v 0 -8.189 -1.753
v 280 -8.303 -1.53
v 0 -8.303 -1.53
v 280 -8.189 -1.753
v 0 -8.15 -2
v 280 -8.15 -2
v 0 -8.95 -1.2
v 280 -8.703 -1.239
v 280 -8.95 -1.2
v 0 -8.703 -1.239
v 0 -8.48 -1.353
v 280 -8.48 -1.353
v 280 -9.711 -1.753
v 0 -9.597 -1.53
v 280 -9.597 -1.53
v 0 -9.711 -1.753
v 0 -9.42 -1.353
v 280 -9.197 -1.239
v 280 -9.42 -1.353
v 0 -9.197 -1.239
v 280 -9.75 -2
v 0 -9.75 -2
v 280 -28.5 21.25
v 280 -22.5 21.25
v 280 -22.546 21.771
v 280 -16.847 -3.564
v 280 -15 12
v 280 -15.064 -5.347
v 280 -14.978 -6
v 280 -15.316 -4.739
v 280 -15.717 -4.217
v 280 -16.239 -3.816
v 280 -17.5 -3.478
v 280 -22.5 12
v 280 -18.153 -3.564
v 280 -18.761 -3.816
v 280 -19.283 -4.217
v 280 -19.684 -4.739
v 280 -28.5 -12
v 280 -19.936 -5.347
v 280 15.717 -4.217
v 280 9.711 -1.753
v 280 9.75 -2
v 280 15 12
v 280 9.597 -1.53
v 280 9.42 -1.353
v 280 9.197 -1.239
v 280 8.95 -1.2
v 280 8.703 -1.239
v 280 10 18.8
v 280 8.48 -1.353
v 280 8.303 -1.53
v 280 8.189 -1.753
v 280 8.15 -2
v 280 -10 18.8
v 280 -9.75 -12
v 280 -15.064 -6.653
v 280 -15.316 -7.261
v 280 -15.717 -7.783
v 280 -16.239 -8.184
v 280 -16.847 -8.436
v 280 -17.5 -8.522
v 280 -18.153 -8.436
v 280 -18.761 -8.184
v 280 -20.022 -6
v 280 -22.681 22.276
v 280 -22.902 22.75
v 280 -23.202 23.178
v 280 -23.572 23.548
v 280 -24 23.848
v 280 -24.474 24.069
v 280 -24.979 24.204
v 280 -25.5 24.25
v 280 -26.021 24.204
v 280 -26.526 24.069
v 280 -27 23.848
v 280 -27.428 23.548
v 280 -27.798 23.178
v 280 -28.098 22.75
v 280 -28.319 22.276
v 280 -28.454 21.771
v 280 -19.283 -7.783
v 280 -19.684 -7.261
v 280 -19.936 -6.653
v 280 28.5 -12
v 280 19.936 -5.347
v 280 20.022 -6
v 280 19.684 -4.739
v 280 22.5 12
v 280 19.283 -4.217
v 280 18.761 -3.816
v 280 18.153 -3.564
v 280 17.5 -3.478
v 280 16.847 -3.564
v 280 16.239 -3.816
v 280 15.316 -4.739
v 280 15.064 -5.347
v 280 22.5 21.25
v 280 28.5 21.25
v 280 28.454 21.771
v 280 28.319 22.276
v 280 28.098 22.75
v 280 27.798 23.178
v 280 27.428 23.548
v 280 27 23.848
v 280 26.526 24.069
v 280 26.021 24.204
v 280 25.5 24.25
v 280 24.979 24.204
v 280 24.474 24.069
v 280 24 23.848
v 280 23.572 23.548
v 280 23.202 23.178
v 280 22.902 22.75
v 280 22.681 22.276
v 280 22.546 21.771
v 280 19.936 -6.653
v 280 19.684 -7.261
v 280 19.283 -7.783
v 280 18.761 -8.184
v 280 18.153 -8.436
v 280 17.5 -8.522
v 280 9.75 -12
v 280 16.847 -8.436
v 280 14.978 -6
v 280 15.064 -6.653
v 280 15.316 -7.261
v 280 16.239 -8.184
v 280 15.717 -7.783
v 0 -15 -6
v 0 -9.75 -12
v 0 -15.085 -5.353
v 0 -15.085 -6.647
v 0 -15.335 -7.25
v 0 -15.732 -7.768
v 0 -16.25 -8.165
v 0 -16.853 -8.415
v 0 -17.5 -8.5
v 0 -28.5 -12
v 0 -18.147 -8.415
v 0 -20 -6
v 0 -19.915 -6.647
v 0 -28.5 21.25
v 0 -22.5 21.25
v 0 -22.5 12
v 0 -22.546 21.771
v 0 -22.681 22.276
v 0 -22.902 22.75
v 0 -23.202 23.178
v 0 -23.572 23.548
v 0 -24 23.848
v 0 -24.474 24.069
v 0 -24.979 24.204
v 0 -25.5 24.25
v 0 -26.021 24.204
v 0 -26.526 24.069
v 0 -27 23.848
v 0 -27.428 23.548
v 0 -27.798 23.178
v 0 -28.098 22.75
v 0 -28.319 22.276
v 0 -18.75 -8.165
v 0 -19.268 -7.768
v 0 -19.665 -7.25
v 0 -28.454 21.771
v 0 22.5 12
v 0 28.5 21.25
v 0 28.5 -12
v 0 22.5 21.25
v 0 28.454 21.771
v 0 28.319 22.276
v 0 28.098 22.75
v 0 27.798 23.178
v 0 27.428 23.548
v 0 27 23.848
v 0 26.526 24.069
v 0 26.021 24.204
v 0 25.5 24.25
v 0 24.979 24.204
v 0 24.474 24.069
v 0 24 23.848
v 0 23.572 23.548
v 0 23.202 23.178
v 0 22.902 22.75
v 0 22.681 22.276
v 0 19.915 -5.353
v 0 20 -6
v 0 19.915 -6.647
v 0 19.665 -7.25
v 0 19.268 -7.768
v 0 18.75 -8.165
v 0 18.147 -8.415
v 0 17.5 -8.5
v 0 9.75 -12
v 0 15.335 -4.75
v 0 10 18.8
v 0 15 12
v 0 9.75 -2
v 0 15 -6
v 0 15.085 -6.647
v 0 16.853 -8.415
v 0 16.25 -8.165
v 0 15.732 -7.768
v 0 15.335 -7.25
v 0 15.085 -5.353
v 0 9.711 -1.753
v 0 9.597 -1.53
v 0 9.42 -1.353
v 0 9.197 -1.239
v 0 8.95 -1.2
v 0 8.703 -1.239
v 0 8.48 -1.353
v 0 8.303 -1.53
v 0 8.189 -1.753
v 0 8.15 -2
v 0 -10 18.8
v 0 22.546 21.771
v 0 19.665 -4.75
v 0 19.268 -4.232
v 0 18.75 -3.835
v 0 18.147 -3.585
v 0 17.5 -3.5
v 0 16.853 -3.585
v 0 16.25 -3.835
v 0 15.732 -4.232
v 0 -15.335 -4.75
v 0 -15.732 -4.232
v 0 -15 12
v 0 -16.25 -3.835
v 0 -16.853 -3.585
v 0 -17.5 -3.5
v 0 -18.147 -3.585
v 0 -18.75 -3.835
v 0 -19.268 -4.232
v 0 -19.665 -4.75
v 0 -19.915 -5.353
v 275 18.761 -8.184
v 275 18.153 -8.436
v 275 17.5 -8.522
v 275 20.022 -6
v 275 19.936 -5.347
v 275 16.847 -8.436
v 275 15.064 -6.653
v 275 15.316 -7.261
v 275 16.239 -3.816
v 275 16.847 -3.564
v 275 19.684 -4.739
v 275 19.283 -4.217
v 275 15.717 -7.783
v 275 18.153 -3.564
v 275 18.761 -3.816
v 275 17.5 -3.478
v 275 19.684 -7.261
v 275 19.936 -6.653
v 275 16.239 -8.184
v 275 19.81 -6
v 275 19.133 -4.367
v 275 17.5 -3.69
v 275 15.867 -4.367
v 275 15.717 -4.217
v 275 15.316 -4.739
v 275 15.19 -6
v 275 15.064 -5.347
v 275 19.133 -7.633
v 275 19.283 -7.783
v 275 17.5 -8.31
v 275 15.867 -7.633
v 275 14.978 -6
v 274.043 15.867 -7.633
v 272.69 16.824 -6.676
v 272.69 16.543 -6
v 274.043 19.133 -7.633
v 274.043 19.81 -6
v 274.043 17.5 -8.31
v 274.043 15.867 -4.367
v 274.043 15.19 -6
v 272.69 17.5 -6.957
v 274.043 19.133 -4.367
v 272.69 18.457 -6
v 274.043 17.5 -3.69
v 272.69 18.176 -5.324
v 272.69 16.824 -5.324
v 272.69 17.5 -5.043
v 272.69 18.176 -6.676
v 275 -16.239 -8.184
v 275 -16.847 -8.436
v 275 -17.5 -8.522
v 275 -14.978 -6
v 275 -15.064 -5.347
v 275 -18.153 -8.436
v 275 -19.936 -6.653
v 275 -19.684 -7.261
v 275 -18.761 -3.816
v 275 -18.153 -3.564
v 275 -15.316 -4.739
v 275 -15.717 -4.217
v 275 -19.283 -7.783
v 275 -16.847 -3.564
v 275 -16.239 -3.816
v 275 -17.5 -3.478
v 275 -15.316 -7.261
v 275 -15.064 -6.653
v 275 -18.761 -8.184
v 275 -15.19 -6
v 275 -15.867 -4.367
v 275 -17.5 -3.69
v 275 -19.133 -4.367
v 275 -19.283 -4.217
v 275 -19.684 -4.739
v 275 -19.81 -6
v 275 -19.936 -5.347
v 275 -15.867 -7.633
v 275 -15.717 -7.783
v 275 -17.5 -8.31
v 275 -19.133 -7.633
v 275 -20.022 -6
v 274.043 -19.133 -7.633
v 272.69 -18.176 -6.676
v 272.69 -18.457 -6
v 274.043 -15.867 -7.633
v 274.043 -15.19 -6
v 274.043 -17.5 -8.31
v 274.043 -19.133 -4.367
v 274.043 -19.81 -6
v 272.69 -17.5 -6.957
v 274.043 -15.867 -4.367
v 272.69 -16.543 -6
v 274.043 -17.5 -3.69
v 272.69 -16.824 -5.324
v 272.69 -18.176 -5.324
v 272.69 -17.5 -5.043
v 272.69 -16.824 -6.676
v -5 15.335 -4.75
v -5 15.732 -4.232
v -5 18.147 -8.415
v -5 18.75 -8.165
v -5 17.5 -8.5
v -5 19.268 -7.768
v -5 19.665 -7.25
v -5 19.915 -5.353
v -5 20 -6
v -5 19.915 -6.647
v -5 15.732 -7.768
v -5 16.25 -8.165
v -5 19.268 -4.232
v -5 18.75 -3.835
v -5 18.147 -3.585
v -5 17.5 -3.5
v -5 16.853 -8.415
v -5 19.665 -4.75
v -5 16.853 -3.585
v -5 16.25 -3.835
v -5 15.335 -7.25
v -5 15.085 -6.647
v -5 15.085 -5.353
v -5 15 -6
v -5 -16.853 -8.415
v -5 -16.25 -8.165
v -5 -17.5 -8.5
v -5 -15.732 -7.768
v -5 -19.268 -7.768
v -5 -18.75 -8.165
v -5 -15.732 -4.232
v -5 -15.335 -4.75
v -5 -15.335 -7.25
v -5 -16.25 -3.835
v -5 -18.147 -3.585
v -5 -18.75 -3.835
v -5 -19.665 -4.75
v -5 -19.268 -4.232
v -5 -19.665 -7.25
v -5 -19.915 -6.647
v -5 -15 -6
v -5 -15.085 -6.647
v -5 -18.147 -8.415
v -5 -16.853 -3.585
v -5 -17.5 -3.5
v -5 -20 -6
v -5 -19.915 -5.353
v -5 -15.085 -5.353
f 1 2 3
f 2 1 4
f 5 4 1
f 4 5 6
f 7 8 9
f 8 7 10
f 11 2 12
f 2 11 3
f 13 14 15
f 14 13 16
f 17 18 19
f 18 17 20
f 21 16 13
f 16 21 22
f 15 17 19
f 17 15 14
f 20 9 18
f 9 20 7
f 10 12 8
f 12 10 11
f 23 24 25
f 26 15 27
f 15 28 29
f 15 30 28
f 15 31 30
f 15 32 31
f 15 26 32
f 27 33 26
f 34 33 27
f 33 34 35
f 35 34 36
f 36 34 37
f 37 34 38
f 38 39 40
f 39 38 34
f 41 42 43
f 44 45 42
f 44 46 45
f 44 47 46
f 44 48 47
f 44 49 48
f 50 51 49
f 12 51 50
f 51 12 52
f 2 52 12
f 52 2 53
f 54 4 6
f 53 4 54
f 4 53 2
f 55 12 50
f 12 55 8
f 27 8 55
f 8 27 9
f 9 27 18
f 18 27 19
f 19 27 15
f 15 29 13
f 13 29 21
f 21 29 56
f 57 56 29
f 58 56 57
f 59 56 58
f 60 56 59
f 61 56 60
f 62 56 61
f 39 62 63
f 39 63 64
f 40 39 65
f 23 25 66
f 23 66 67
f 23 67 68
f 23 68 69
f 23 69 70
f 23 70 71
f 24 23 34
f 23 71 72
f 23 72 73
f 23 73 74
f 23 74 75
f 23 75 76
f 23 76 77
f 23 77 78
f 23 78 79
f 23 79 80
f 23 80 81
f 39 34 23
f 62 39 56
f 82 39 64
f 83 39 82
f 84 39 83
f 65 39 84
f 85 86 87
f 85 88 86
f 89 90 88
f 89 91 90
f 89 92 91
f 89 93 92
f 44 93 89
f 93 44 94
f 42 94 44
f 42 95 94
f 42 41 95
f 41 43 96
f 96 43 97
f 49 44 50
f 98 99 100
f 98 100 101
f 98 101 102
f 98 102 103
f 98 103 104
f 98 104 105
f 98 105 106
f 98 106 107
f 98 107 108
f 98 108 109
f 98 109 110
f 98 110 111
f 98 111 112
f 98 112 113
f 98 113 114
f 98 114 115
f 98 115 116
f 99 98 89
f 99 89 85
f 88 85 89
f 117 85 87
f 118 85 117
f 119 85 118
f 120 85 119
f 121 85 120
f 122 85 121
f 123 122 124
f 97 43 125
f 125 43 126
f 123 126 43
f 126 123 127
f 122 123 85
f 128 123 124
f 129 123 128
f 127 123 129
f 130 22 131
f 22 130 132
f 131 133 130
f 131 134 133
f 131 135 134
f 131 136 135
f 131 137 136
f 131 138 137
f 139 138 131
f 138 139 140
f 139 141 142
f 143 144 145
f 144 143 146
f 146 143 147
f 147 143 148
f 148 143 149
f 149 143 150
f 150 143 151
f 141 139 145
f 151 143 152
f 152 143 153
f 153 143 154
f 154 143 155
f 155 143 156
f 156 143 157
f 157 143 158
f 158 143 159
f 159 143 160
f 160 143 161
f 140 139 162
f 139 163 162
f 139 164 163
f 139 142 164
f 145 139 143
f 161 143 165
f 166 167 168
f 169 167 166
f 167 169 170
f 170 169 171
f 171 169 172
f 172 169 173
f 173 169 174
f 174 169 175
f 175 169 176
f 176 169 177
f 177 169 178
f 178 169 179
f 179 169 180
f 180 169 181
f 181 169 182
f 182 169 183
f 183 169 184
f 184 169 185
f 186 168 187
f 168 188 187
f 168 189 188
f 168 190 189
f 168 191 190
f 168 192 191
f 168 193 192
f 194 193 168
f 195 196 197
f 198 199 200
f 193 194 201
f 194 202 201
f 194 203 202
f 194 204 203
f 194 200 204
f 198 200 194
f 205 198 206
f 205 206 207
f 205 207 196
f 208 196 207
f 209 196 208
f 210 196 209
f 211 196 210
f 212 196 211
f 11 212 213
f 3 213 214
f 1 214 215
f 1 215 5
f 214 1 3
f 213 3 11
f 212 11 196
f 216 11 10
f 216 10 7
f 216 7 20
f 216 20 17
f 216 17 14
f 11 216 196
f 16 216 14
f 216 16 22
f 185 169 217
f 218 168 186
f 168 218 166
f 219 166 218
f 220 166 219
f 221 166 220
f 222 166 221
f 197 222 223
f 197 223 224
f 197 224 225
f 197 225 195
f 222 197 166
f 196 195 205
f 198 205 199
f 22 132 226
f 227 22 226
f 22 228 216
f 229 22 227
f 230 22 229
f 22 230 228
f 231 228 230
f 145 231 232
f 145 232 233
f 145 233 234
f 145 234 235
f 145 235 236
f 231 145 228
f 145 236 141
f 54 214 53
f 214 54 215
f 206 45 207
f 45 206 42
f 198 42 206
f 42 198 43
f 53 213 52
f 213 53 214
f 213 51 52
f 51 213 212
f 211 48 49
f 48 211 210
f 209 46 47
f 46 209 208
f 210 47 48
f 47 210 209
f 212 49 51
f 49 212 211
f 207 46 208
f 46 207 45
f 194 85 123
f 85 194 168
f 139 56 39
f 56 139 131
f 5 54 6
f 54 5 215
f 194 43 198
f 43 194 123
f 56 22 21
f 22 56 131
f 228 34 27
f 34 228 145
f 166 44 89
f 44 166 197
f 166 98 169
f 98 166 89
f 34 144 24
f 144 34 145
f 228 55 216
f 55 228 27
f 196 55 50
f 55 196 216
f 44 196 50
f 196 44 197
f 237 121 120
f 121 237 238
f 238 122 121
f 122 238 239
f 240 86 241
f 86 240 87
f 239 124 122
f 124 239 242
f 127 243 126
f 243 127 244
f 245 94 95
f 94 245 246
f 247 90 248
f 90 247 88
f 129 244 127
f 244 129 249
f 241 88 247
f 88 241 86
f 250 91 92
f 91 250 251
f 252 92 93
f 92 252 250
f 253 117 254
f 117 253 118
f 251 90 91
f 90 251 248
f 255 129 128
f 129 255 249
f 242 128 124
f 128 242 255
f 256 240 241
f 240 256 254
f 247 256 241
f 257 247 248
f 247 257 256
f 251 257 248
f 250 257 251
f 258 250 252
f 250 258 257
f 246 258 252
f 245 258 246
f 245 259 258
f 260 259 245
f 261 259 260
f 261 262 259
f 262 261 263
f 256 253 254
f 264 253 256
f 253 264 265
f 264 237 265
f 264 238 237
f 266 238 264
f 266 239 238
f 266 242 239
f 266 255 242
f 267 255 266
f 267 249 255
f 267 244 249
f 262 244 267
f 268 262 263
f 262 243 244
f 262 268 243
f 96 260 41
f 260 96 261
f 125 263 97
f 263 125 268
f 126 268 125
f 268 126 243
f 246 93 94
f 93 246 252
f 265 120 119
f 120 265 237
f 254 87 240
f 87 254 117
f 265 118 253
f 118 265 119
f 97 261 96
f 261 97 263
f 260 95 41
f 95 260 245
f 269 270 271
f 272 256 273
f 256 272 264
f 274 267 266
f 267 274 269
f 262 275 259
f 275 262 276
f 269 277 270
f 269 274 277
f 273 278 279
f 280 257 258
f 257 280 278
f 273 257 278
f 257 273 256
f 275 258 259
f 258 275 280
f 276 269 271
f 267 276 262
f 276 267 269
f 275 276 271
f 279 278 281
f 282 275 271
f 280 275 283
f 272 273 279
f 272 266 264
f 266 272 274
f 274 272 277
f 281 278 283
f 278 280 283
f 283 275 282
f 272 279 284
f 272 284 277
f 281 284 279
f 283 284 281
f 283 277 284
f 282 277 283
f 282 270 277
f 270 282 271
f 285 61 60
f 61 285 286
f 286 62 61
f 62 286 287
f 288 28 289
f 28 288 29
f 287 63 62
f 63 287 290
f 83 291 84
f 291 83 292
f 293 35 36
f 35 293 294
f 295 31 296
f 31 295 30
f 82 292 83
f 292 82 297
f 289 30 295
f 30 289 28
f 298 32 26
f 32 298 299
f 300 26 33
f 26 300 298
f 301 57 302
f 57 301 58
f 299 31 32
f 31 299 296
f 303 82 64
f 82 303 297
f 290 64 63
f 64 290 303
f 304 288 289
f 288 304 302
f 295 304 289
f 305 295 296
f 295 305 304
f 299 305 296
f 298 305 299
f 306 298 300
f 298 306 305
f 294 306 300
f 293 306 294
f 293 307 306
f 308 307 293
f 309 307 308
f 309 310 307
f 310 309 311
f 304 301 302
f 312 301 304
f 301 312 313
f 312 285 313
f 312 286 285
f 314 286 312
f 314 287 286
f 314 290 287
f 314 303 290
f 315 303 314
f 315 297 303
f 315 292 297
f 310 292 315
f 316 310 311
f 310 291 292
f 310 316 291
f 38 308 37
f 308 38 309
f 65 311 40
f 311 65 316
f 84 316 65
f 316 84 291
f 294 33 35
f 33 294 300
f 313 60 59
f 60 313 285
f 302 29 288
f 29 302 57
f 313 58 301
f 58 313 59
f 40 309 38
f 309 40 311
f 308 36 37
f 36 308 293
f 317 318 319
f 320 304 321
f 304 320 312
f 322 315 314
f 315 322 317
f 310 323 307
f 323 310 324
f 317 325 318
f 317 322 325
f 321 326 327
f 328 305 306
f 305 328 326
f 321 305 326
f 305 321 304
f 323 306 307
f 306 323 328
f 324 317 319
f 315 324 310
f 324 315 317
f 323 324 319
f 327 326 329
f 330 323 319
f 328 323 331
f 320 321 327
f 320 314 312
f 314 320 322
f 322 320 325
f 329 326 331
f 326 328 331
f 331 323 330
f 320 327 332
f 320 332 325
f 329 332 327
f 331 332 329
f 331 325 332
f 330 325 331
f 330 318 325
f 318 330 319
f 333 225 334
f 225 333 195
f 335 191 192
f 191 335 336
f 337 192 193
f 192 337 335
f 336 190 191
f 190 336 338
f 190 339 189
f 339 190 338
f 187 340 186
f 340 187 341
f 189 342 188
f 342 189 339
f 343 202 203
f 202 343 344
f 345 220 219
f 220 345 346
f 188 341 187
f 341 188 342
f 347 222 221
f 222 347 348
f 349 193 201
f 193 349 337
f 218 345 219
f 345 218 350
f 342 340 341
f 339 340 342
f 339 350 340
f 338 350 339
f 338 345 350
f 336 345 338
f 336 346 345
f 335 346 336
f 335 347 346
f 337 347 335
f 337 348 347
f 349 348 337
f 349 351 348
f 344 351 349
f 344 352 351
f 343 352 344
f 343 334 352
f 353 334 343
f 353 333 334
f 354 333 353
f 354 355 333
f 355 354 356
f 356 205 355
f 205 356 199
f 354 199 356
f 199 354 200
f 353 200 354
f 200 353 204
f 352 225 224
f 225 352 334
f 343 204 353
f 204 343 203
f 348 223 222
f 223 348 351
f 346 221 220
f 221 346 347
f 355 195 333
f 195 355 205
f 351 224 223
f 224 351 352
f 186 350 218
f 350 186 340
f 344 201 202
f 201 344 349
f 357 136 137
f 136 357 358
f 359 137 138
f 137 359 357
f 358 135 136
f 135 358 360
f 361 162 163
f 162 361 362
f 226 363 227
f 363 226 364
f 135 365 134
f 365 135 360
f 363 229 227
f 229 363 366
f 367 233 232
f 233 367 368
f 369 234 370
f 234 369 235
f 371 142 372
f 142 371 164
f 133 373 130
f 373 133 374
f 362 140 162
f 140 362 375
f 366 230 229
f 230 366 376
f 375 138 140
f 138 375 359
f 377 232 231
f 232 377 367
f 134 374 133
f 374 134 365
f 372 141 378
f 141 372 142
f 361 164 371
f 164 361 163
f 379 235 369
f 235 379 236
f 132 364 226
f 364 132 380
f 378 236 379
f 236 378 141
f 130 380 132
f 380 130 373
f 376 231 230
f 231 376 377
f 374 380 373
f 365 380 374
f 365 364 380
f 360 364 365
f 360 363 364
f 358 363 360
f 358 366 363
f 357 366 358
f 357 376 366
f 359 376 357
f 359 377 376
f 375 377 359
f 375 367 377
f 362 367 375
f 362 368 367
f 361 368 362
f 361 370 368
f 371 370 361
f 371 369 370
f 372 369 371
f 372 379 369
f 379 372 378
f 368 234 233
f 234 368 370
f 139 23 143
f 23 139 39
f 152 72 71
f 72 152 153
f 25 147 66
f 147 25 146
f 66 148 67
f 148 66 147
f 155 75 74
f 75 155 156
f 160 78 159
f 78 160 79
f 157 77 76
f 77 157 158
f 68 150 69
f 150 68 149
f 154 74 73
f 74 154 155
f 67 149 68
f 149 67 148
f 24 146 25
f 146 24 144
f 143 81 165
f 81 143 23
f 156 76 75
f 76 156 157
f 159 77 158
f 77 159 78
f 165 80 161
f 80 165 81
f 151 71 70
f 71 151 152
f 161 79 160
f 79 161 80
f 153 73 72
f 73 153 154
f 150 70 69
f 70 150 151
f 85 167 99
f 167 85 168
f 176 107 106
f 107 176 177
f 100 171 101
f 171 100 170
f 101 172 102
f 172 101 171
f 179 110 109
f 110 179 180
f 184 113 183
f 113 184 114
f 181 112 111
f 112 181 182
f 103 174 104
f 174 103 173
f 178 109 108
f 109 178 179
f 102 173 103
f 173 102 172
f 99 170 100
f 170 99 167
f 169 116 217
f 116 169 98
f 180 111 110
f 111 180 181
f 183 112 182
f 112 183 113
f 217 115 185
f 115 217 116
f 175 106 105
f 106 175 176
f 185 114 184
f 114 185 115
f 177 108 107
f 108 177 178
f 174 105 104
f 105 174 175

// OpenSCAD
// file: bottom_bracket.scad
include <dimensions.scad> 

module screw_slot() {
  $fn=32;
  
  cylinder(h=total_height+1, d=screw_body_clearance);
  cylinder(h=total_height - screw_body_depth - screw_angle_depth, d=screw_head_clearance);
  translate([0, 0, total_height - screw_body_depth - screw_angle_depth]) {
    cylinder(h=screw_angle_depth, d1=screw_head_clearance, d2=screw_body_clearance);
  }
}

// Z should be set to the surface that is being joined to
module joiner_pins_male() {
  translate([depth/2, (hd_enclosure_width/2) - pin_diameter, 0]) {
    cylinder(d=pin_diameter, h=pin_length, $fn=24);
  }
  translate([depth/2, -((hd_enclosure_width/2) - pin_diameter), 0]) {
    cylinder(d=pin_diameter, h=pin_length, $fn=24);
  }
}

module cylinder_outer(height,radius,fn){
  fudge = 1/cos(180/fn);
  cylinder(h=height,r=radius*fudge,$fn=fn);
}

module sphere_outer(r,fn){
  fudge = 1/cos(180/fn);
  sphere(r=r*fudge,$fn=fn);
}

module octahedron(r=10) {
    polyhedron(
        points=[
            [r,0,0], [-r,0,0], [0,r,0], [0,-r,0], // Equator
            [0,0,r], [0,0,-r]                      // Poles
        ],
        faces=[
            [0,2,4], [2,1,4], [1,3,4], [3,0,4],    // Top faces
            [0,3,5], [3,1,5], [1,2,5], [2,0,5]     // Bottom faces
        ]
    );
}

module joiner_pins_female() {
  module pin() {
    cylinder_outer(radius=pin_diameter/2, height=pin_length, fn=24);
    //translate([0, 0, 0/*pin_length*/]) {
      sphere(r=pin_diameter/2, $fn=8);
      //}
  }
  
  translate([depth/2, (hd_enclosure_width/2) - pin_diameter, -pin_length]) {
    pin();
  }
  translate([depth/2, -((hd_enclosure_width/2) - pin_diameter), -pin_length]) {
    pin();
  }
}

module main_body(ts=true, h=total_height) {

  // the radius of the little fold in the PD side
  pd_enclosure_mini_radius = 0.8;
  dfloor = (ts ? seal_floor_offset : 0);
    
  difference() {

    // the floor
    translate([-dfloor, -hd_enclosure_width/2, 0]) {
      cube([dfloor + depth,hd_enclosure_width, h]);
    }

    // the carveout for the pet door side
    translate([depth - pd_enclosure_depth, -pd_enclosure_width/2, 0]) {
      cube([pd_enclosure_depth, pd_enclosure_width, h]);
      rotate([0, 0, 90]) {
        translate([pd_enclosure_mini_radius, 0, 0]){
          cylinder(r=pd_enclosure_mini_radius, h=h, $fn=20);
        }
        translate([pd_enclosure_width - pd_enclosure_mini_radius, 0, 0]) {
          cylinder(r=pd_enclosure_mini_radius, h=h, $fn=20);
        }
      }
    }
  }

  if (ts) {
    translate([-dfloor, 0, 0])
    trapezoid_seal(h=h);
  }
}

// the trapezoidal seal
module trapezoid_seal(h=total_height) {
  x0 = -seal_depth;

  y0 = -seal_small_width / 2;
  y1 = seal_small_width / 2;
  y2 = -seal_large_width / 2;
  y3 = seal_large_width / 2;
  
  linear_extrude(height=h) {
    polygon(points=[[x0, y0], [x0, y1], [0, y3], [0, y2]]);
  }
}

module track_slot() {
  l = seal_depth + depth + seal_floor_offset;
  
  translate([-(seal_depth + seal_floor_offset), 0, 0]) {
    rotate(a=[0,90,0]) {
      # cylinder(h=l, d=track_diameter, $fn=32);
    }
  }
}

module seal(h=overhang_height, l=hd_enclosure_depth + depth) {
  ri = overhang_indoor_width / 2;
  ro = overhang_outdoor_width / 2;

  // the indoor overhang
  translate([ri,
             -hd_enclosure_width/2 - overhang_indoor_width,
             track_height]) {
    cube([l-ri,
          overhang_indoor_width,
          h]);
    translate([0, ri, overhang_height-h])
      cylinder(r=ri, h=h, $fn=36);
  }

  // the outdoor overhang
  translate([ro,
             hd_enclosure_width/2,
             track_height]) {
    cube([l-ro,
          overhang_outdoor_width,
          h]);
    translate([0, ro, overhang_height-h])
      cylinder(r=ro, h=h, $fn=36);
  }
}

module seal_overhang(l=hd_enclosure_depth + depth) {
  translate([-hd_enclosure_depth, 0, 0])
    seal(l=l);
}


screw_y_offset = total_width / 4 + 1;
screw_x_offset = screw_body_clearance + 2;

module screw_slots() {
  translate([screw_x_offset, screw_y_offset, 0])
    screw_slot();
  
  translate([screw_x_offset, -screw_y_offset, 0])
    screw_slot();
}

// some little dots to help grip the petdoor side
module grippies(l=total_length) {
  grippy_radius = 0.75;
  grippy_thick = 0.3;
  grippy_angle = 45;
  
  for (x=[10, l-10, l/2]) {
    translate([x, 0, 0]) {
      /*
      translate([0, pd_enclosure_width/2, pd_enclosure_depth/2 - depth]) {
        // # sphere(r=grippy_radius, $fn=8);
        rotate([0, 90, 0])
        rotate([0, 0, 180-grippy_angle])
          cube([grippy_thick, grippy_radius, 3]);
      }
      translate([0, -pd_enclosure_width/2, pd_enclosure_depth/2 - depth]) {
        rotate([0, 90, 0])
        rotate([0, 0, grippy_angle])
          cube([grippy_thick, grippy_radius, 3]);
        // sphere(r=grippy_radius, $fn=8);
      }
      */
      translate([0, -pd_enclosure_width/2, pd_enclosure_depth/2 - depth])
        rotate([grippy_angle, 0, 0])
        cylinder(r=grippy_radius, h=grippy_thick, $fn=20);
      translate([0, pd_enclosure_width/2, pd_enclosure_depth/2 - depth])
        rotate([90, 0, 0])
        rotate([grippy_angle, 0, 0])
        cylinder(r=grippy_radius, h=grippy_thick, $fn=20);
    }
  }
}

module bottom_bracket() {
  
  seal_overhang();

  // screw_slots();

  difference() {
    main_body();
    track_slot();

    translate([0, 0, total_height-pin_length]) {
      joiner_pins_male();
    }
  }
}

// rotate([0, 180, 0])
translate([0, 0, -total_height]) bottom_bracket();
// file: dimensions.scad
//      +---------------------+
//      |                     |
//      |                     |
//      |                     |
//      |                     |
//      |                     |
//      |                     |
//      |                     |
//      |                     |
//      |                     |
//      |                     |
//   ^  |                     |
//   |  |                     |
//   Y  |                     |
//   |  |                     |
//   |  |                     |
//      +---------------------+
//       --  X (depth) --> 
// 

// the depth of the main body
depth = 12;

// the depth of the latch plate
latch_plate_depth = 3.25;

// the width of the enclosure for the human door side
hd_enclosure_width = 45;

// the depth of the enclosure for the human door side
hd_enclosure_depth = 10 * 2.5 + latch_plate_depth - 6 + 2;

// the width of the indoor overhang
overhang_indoor_width = 6;

// the width of the outdoor overhang
overhang_outdoor_width = 6;

// the total height
total_height = 290;

// the width of the enclosure for the pet door side
pd_enclosure_width = 20 - 0.5;

// the depth of the enclosure for the pet door side
pd_enclosure_depth = 10;

seal_floor_offset = 12;
seal_small_width = 20;
seal_large_width = 30;
seal_depth = 6.8;

// the height of the track inset area
track_height = 18;

// the diameter of the track
track_diameter = 7;

// the height of the overhang
overhang_height = total_height - track_height;

// the total width
total_width = hd_enclosure_width + overhang_indoor_width + overhang_outdoor_width;

screw_body_clearance = 4.5;
screw_head_clearance = 9;
screw_body_depth = 10;
screw_angle_depth = 3;

// pins
pin_diameter = 5;
pin_length = 5;

module simple_hd_seal(l=total_length) {
  // indoor HD seal
  ri = overhang_indoor_width / 2;
  
  translate([0,
             -(hd_enclosure_width/2 + overhang_indoor_width),
             -depth]) {
    cube([l,
          overhang_indoor_width,
          depth + hd_enclosure_depth - ri]);
    translate([0, overhang_indoor_width/2, hd_enclosure_depth + depth - ri])
      rotate([0, 90, 0])
      cylinder(r=ri, h=l, $fn=36);
  }

  // outdoor HD seal
  ro = overhang_outdoor_width / 2;
  
  translate([0,
             hd_enclosure_width/2,
             -depth]) {
    cube([l,
          overhang_outdoor_width,
          depth + hd_enclosure_depth - ro]);
    translate([0, overhang_indoor_width/2, hd_enclosure_depth + depth - ro])
      rotate([0, 90, 0])
      cylinder(r=ro, h=l, $fn=36);
  }
}

top_bracket_pd_expansion_length = 166;
top_bracket_pd_expansion_width = 24;
top_bracket_frame_depth = 26;
// main file
include <dimensions.scad>;
use <bottom_bracket.scad>;

total_length = 280;

module latch_plate_carveout() {
  //cube([
}

difference() {
  rotate([0, 90, 0]) {
    main_body(h=total_length);
  }
  union() {
    latch_plate_carveout();
    translate([total_length, 0, 0])
      rotate([0, 90, 0])
      joiner_pins_female();
  }
}

       translate([-pin_length, 0, 0]) {
  rotate([0, 90, 0]) {
    # joiner_pins_male();
  }
}

simple_hd_seal(l=total_length);
